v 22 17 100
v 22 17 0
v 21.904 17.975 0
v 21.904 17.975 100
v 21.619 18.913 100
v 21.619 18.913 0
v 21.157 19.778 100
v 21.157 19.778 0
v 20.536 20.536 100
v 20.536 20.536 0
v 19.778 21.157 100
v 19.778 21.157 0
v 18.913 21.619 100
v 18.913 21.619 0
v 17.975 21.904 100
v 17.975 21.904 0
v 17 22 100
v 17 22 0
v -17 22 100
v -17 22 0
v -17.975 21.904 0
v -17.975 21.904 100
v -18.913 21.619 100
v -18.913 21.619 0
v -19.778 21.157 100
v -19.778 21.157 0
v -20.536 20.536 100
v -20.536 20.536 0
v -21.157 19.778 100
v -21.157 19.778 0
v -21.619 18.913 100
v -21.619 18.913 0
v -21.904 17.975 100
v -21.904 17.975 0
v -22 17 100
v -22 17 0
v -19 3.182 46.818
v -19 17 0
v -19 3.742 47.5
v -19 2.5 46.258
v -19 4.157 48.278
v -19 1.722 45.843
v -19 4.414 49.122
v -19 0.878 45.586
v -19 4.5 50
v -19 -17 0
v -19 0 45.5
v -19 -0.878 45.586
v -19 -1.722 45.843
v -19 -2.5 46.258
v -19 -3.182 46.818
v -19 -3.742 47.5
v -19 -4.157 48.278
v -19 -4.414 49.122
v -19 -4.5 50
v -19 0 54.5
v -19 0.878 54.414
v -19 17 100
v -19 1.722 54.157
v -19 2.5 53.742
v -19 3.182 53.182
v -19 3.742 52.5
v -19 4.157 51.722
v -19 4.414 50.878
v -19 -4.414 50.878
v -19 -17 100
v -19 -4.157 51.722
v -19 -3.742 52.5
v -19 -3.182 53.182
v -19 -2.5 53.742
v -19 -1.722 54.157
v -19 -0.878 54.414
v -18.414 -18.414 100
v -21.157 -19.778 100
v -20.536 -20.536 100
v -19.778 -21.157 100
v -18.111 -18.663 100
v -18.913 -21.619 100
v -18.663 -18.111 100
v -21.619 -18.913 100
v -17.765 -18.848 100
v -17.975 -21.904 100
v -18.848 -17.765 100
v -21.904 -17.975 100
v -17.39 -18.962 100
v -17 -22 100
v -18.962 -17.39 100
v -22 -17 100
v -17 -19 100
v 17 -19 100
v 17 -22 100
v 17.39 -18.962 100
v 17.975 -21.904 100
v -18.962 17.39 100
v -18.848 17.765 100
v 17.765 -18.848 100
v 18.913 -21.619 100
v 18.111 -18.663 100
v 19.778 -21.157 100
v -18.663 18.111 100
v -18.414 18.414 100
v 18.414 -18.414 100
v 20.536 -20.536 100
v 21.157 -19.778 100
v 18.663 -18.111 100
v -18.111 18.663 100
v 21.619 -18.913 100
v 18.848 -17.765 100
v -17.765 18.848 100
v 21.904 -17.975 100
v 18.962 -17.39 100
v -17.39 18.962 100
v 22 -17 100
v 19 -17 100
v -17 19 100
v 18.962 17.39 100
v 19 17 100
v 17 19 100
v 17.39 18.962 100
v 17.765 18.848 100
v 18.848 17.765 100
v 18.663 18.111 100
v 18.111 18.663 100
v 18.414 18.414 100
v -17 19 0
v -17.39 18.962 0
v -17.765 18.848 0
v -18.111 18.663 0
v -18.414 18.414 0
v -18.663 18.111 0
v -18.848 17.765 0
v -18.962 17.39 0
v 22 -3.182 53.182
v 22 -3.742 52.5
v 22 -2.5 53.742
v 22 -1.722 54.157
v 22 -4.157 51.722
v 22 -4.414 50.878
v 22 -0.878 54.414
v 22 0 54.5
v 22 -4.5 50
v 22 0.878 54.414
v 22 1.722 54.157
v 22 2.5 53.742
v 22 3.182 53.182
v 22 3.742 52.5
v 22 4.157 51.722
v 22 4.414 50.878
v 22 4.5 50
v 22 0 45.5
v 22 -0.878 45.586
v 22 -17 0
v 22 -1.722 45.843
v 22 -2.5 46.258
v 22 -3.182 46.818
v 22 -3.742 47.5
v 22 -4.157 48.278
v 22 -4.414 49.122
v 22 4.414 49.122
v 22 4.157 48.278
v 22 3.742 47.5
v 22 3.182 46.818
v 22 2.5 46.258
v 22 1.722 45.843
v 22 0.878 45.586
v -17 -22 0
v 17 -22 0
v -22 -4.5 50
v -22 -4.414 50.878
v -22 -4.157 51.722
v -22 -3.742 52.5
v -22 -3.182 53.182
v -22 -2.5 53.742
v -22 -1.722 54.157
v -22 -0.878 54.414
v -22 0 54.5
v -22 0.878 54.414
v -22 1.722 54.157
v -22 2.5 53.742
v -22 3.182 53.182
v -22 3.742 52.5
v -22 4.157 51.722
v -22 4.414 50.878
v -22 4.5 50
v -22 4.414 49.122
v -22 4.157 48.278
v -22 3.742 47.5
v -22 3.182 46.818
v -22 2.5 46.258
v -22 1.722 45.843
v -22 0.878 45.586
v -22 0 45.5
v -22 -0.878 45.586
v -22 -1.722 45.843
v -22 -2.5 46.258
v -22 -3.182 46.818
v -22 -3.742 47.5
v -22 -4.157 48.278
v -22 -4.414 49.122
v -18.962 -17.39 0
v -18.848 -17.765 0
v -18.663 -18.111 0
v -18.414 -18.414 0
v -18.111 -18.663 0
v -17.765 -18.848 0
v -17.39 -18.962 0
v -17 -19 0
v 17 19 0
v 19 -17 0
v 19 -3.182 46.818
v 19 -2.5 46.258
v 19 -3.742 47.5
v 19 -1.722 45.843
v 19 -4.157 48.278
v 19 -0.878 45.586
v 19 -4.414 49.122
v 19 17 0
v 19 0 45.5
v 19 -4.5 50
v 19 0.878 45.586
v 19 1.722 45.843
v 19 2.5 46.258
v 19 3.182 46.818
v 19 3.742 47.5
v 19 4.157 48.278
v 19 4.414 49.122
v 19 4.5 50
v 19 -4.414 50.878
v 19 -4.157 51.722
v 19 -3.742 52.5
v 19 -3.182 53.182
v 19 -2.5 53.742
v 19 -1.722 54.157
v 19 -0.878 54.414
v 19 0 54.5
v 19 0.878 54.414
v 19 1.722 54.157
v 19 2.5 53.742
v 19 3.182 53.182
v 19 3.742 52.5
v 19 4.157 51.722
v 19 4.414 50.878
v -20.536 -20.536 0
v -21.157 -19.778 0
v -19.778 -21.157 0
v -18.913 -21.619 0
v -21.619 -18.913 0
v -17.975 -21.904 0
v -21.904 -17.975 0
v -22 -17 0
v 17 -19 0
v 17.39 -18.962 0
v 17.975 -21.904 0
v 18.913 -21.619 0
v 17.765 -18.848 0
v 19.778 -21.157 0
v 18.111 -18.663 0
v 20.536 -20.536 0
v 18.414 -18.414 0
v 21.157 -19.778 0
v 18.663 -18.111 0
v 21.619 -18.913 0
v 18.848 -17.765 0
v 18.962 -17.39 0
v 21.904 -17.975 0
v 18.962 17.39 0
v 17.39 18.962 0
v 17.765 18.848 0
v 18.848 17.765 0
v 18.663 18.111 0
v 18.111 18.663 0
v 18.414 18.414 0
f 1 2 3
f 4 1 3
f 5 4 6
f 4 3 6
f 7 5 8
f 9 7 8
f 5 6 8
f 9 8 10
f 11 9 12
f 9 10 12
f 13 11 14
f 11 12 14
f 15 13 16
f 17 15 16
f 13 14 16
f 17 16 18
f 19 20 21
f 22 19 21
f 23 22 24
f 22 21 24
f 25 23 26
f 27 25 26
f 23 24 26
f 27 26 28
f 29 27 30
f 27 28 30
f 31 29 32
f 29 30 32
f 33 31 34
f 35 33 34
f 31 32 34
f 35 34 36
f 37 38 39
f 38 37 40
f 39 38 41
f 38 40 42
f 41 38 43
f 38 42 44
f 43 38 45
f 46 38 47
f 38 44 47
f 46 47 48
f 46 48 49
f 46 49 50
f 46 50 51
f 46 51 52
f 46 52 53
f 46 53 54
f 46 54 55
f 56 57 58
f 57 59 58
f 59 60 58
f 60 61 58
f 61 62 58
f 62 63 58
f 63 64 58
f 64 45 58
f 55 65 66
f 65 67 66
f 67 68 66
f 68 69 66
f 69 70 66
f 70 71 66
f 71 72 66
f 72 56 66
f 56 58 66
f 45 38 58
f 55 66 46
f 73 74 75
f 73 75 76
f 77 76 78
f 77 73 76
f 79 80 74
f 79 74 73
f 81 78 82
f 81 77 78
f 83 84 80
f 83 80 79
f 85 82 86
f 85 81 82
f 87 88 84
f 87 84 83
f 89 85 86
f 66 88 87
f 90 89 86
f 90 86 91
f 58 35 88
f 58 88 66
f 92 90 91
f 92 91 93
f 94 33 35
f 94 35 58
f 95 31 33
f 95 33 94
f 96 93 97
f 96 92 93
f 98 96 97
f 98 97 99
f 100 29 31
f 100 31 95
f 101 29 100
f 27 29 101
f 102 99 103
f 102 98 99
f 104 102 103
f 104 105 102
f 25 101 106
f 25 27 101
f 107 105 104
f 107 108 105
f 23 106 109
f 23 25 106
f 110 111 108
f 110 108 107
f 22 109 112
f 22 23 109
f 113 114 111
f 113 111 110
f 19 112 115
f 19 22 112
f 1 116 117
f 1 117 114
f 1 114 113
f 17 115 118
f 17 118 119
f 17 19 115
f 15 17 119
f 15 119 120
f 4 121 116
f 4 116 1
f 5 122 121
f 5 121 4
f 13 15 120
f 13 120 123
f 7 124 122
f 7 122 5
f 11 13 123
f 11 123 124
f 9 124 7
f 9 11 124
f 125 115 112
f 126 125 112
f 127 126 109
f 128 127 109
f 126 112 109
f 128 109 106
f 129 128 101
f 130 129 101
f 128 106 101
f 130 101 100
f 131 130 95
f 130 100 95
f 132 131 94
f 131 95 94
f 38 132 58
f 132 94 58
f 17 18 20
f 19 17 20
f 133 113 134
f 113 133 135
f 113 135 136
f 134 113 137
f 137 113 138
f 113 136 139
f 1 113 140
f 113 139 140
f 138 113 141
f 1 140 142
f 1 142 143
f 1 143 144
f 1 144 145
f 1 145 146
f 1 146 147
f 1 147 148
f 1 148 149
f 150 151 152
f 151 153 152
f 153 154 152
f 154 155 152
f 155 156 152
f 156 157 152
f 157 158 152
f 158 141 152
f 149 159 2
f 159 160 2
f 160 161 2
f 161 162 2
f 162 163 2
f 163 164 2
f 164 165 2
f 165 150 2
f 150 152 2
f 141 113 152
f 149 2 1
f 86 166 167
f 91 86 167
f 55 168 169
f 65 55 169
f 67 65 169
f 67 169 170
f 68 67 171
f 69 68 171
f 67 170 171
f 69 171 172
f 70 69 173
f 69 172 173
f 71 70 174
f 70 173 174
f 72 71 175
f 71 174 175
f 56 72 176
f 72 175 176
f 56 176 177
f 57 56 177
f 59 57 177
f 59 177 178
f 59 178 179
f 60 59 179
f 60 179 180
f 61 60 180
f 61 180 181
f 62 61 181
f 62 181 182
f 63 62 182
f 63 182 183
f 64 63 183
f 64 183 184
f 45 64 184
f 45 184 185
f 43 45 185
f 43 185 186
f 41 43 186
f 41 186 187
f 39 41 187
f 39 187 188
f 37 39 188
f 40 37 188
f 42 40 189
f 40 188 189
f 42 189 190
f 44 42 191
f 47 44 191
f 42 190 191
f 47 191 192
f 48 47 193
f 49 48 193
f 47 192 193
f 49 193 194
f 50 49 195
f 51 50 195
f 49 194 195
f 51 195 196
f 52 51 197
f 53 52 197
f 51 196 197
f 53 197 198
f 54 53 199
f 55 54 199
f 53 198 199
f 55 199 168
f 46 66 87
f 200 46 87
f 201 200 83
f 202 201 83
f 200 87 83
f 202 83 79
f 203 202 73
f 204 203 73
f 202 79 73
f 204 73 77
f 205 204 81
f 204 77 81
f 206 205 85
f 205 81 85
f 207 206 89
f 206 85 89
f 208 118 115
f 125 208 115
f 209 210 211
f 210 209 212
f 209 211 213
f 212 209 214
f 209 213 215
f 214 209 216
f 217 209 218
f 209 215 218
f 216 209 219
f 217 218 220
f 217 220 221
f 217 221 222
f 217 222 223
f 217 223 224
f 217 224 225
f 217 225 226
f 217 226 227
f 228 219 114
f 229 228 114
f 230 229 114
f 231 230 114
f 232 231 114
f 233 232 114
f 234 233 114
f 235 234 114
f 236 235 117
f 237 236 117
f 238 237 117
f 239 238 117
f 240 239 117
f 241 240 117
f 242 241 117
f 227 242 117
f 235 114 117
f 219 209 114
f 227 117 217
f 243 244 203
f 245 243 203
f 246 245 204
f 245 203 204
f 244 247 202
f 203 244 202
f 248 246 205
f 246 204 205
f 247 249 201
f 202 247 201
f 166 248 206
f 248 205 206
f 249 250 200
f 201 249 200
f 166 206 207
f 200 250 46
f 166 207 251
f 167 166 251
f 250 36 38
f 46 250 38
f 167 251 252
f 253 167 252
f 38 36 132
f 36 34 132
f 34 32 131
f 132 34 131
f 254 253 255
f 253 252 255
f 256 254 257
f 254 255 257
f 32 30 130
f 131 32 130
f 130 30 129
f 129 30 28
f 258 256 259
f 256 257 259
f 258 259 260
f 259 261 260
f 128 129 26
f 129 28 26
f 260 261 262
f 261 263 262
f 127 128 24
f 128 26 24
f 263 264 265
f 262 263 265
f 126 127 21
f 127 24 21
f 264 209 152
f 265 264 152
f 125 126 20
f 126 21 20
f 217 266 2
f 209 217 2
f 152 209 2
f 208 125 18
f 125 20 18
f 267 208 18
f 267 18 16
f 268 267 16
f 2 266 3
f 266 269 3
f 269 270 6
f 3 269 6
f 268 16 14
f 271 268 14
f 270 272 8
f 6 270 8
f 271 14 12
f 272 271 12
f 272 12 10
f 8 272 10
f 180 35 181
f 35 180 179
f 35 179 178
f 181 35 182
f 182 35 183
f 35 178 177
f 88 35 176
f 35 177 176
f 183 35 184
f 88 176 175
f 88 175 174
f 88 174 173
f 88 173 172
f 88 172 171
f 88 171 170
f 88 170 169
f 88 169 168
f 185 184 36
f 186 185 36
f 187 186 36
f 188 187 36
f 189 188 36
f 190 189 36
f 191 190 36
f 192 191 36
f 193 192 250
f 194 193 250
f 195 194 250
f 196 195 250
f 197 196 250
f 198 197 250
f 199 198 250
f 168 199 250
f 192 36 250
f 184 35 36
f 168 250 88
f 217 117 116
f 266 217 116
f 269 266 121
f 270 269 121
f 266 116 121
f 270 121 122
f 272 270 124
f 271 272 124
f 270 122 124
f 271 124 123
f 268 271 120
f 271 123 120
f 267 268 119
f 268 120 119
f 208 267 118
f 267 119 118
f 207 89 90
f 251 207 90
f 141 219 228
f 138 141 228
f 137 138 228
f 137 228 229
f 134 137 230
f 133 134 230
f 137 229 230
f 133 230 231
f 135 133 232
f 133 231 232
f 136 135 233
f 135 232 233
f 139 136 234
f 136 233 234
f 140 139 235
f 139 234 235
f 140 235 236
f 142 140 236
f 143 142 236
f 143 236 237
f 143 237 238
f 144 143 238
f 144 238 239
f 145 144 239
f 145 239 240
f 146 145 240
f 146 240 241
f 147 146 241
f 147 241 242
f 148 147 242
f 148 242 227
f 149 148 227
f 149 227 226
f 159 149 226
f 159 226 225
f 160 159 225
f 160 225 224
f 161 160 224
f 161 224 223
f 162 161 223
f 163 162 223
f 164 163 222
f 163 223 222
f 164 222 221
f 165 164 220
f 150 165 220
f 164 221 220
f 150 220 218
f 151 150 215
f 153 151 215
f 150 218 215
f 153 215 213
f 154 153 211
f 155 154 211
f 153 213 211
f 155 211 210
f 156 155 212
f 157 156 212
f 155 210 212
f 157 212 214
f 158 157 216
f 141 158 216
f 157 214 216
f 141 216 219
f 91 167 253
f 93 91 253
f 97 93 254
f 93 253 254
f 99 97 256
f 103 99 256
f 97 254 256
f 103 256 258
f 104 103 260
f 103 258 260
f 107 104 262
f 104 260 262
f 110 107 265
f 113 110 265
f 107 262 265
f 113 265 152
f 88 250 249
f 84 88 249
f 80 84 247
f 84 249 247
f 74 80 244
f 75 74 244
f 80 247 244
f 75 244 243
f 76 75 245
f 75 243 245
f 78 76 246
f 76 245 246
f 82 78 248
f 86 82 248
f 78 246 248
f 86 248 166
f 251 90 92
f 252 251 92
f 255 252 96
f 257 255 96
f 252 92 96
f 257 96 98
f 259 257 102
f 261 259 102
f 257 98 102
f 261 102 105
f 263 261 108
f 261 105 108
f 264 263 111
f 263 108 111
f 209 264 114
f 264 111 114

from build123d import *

# Parameters (mm, degrees)
F1_DEPTH = 100
F3_DEPTH = 100.001
F5_D     = 9


with BuildPart() as f1:
    # F0 (on Top) → F1 (new body)
    with BuildSketch(Plane.XY):
        with BuildLine():
            ThreePointArc((22, 17), (20.535534, 20.535534), (17, 22))
            Line((17, 22), (-17, 22))
            ThreePointArc((-17, 22), (-20.535534, 20.535534), (-22, 17))
            Line((-22, 17), (-22, -17))
            ThreePointArc((-22, -17), (-20.535534, -20.535534), (-17, -22))
            Line((-17, -22), (17, -22))
            ThreePointArc((17, -22), (20.535534, -20.535534), (22, -17))
            Line((22, -17), (22, 17))
        make_face()
    extrude(amount=F1_DEPTH)

    # F2 (on face) → F3 (cut, through all)
    with BuildSketch(Plane.XY.offset(100)):
        with BuildLine():
            ThreePointArc((-19, -17), (-18.414214, -18.414214), (-17, -19))
            Line((-17, -19), (17, -19))
            ThreePointArc((17, -19), (18.414214, -18.414214), (19, -17))
            Line((19, -17), (19, 17))
            ThreePointArc((19, 17), (18.414214, 18.414214), (17, 19))
            Line((17, 19), (-17, 19))
            ThreePointArc((-17, 19), (-18.414214, 18.414214), (-19, 17))
            Line((-19, 17), (-19, -17))
        make_face()
    extrude(amount=-F3_DEPTH, mode=Mode.SUBTRACT)

    # F5 (through all)
    with Locations(Plane.YZ.offset(22)):
        with Locations((0, 50)):
            Hole(F5_D / 2)


solid = f1.part
